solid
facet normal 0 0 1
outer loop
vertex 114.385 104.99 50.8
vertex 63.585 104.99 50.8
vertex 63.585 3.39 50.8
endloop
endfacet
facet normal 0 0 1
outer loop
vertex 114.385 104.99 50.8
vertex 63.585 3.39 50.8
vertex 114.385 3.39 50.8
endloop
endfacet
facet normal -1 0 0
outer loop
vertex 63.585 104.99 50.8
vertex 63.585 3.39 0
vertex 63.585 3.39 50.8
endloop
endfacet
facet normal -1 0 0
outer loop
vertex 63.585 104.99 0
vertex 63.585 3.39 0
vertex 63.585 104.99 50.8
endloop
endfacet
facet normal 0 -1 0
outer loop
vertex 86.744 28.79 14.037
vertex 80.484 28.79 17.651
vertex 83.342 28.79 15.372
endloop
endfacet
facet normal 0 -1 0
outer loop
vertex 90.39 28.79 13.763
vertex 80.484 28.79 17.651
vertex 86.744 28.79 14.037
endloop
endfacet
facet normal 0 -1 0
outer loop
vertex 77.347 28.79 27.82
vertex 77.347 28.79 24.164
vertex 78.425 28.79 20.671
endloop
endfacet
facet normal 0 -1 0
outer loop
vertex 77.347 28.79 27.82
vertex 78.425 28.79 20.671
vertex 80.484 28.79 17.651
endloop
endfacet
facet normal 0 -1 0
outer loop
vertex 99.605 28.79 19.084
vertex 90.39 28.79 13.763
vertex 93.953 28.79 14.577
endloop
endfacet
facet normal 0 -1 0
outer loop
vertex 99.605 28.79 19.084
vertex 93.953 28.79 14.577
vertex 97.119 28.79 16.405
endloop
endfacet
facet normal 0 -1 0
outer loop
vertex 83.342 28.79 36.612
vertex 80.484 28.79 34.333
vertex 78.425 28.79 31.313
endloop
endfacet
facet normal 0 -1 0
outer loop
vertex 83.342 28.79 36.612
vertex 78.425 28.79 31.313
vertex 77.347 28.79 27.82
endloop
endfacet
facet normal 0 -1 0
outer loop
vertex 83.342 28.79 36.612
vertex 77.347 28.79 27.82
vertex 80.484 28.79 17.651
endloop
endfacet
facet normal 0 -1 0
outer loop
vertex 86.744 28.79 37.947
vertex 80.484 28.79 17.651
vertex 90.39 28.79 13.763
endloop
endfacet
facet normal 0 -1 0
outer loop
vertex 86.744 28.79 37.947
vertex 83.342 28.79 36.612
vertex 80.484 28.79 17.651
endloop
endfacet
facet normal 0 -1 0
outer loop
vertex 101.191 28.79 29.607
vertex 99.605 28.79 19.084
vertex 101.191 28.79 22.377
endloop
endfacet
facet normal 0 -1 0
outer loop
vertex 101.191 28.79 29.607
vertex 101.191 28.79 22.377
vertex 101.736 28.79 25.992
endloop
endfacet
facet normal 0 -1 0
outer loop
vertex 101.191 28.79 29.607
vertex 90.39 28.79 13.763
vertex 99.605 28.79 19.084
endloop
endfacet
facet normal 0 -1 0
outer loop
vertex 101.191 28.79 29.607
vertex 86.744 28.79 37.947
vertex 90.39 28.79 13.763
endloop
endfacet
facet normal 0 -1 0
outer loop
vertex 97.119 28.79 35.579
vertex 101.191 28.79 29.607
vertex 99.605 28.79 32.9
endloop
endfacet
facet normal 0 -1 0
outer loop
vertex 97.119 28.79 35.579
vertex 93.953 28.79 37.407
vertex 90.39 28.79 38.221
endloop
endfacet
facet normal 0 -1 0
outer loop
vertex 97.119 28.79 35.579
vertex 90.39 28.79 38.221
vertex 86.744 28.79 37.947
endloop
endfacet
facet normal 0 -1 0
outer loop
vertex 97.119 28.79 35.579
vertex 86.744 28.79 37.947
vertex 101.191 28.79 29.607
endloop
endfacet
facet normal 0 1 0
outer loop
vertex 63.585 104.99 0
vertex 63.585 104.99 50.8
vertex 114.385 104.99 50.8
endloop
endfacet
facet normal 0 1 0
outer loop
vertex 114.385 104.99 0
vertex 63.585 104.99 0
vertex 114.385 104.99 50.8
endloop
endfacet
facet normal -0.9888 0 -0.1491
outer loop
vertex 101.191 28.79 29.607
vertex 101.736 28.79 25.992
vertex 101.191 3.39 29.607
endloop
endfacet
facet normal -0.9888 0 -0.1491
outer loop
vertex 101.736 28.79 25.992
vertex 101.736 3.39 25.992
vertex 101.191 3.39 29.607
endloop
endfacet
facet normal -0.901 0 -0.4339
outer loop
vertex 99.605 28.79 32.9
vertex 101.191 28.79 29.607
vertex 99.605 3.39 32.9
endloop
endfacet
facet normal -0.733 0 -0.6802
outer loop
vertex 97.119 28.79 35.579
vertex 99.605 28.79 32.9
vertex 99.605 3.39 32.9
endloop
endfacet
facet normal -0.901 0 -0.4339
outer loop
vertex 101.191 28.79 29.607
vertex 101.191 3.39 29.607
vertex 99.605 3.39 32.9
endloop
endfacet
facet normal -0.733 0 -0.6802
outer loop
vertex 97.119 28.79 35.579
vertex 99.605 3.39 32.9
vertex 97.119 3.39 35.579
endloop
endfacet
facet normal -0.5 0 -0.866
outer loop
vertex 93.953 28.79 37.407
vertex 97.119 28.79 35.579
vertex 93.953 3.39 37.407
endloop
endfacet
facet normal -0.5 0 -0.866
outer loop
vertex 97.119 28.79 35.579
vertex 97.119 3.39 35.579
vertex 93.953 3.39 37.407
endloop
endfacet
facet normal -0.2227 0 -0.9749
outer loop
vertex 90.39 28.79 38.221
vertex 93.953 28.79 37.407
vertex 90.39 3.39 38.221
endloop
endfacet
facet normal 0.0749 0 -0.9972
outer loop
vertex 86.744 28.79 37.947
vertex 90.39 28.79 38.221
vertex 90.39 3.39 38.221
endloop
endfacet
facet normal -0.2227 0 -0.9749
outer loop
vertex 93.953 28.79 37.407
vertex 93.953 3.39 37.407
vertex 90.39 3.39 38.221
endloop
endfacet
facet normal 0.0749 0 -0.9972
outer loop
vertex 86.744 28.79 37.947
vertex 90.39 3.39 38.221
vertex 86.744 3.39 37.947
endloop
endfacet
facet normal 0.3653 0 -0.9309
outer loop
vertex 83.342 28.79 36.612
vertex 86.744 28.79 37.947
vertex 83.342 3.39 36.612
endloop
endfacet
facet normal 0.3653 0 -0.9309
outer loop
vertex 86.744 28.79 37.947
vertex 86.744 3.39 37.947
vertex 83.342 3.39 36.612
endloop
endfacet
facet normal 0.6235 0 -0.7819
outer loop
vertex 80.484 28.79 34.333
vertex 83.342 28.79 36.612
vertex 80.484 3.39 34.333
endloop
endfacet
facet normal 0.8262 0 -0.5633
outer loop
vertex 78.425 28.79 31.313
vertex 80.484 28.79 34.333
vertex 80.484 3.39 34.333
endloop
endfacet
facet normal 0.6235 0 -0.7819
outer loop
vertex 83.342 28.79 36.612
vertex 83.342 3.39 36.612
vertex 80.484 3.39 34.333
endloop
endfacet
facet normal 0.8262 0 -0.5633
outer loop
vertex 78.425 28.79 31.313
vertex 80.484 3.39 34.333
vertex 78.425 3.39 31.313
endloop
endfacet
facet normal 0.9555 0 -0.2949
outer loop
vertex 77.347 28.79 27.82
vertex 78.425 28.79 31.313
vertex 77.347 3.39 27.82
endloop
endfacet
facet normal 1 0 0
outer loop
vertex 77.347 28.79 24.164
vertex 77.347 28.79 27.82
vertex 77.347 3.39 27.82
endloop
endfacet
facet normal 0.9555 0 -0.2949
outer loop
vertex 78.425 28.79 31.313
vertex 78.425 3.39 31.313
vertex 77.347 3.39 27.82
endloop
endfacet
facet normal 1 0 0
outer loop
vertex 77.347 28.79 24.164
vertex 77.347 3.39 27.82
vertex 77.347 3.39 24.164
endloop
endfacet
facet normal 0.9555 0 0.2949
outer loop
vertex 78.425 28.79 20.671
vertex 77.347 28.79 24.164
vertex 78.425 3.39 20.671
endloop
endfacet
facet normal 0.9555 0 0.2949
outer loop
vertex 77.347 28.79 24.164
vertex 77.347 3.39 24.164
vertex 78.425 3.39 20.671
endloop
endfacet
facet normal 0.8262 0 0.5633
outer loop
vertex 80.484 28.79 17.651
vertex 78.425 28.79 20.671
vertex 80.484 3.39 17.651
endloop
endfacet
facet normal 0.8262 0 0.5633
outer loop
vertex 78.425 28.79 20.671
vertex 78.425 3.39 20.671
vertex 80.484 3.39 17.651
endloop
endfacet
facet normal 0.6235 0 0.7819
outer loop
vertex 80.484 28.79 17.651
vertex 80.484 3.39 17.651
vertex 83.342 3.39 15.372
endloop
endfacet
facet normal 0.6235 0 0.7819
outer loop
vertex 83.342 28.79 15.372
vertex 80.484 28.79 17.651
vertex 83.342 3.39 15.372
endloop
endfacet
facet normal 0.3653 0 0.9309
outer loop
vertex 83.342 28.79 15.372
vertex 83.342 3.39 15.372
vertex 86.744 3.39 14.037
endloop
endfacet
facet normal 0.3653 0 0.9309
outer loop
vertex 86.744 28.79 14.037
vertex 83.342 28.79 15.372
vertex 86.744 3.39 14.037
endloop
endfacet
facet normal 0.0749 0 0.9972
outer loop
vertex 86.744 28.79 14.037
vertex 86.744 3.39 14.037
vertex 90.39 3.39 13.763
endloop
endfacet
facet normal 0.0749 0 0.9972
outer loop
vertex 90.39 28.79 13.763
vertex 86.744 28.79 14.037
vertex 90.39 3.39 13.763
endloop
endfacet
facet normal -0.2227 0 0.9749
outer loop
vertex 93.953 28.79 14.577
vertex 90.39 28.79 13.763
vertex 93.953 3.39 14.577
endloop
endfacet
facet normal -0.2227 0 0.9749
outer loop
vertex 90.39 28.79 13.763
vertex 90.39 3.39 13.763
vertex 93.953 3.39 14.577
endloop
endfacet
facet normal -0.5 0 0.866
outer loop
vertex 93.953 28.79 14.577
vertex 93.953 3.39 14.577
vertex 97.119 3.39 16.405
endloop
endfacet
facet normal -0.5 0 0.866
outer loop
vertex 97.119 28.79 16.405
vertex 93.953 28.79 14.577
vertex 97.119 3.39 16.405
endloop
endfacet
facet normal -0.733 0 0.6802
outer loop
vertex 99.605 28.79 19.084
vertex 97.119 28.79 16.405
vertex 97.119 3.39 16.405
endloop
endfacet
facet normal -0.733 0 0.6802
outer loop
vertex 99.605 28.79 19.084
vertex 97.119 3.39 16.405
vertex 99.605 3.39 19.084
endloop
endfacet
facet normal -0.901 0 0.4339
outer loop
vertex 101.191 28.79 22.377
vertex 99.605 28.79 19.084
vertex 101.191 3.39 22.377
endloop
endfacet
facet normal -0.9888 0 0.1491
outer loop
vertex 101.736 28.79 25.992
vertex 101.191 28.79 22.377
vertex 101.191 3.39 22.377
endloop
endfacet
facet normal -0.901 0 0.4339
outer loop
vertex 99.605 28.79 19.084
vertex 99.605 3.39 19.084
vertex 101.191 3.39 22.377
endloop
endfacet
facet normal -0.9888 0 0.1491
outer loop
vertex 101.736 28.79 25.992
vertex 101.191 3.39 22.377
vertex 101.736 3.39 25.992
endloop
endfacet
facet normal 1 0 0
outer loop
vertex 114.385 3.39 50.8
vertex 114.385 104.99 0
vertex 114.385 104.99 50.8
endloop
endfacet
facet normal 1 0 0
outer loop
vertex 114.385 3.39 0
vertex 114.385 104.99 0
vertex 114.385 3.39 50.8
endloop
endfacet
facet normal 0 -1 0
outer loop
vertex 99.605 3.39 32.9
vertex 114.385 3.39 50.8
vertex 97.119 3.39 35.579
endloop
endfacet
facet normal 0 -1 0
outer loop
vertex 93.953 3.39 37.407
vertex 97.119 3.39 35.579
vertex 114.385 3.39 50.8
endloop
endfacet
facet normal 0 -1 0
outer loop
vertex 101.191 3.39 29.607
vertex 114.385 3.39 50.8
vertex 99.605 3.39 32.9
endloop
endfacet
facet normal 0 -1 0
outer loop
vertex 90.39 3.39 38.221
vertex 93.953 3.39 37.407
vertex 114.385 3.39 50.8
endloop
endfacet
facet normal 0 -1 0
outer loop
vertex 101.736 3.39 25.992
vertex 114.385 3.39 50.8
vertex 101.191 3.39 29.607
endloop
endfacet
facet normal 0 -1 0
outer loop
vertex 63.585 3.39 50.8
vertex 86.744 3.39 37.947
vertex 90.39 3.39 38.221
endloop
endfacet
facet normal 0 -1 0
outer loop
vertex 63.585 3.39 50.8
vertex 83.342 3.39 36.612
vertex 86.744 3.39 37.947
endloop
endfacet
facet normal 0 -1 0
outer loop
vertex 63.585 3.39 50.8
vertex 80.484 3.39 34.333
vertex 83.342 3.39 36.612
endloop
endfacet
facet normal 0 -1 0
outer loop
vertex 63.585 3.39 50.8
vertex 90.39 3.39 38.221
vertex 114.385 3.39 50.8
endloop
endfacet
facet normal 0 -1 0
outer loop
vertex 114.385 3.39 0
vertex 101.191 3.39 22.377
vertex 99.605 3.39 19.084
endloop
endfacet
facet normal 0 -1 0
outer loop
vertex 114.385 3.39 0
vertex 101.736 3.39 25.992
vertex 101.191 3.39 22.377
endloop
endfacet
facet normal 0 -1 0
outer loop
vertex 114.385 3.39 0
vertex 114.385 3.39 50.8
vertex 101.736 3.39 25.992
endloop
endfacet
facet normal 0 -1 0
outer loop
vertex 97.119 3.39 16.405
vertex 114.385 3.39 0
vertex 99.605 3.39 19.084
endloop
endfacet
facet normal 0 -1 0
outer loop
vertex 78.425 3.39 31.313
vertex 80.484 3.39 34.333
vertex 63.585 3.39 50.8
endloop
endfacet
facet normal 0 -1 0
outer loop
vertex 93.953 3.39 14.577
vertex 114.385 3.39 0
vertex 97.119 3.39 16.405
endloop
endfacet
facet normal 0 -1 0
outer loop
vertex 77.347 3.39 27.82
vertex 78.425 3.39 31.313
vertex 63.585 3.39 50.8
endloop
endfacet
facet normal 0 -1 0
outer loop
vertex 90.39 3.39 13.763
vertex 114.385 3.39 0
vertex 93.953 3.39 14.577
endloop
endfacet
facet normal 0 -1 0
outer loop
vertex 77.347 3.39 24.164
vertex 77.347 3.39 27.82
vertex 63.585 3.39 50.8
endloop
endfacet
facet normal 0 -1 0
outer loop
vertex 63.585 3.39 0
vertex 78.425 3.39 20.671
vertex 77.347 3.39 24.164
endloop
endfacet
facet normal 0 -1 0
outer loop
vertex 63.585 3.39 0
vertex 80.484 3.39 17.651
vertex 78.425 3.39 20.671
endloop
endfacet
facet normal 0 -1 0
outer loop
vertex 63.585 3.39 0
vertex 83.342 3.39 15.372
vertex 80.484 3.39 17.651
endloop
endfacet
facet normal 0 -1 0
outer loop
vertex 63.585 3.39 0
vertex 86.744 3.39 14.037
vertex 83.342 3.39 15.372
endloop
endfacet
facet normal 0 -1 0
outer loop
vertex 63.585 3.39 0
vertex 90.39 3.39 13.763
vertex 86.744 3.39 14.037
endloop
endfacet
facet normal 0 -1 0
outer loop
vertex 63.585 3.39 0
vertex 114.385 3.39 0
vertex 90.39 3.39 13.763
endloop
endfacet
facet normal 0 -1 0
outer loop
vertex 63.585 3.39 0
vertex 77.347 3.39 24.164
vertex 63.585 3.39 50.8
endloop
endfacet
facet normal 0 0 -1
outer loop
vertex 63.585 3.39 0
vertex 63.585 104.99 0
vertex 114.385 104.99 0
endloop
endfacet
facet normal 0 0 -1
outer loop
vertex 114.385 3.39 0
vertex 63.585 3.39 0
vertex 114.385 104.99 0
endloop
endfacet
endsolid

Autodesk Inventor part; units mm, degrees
ref_plane "YZ Plane" through (0, 0, 0) normal (1, 0, 0) x (0, 1, 0)
ref_plane "XZ Plane" through (0, 0, 0) normal (0, 1, 0) x (-1, 0, 0)
ref_plane "XY Plane" through (0, 0, 0) normal (0, 0, 1) x (1, 0, 0)
sketch "Sketch1" plane through (0, 0, 0) normal (0, 0, 1) x (1, 0, 0)
  line L0 (63.5852, 104.9902) -> (114.3852, 104.9902)
  line L1 (114.3852, 104.9902) -> (114.3852, 3.3902)
  line L2 (114.3852, 3.3902) -> (63.5852, 3.3902)
  line L3 (63.5852, 3.3902) -> (63.5852, 104.9902)
  point P0 (0, 0)
  dimension "d0" = 50.8
  dimension "d1" = 101.6
extrude "Extrusion1" add sketch "Sketch1" along normal blind 50.8
sketch "Sketch2" plane through (63.5852, 3.3902, 0) normal (0, -1, 0) x (1, 0, 0)
  circle A0 centre (25.8879, 25.992) radius 12.2628
  point P0 (-63.5852, 0)
extrude "Extrusion2" cut sketch "Sketch2" against normal blind 25.4
properties part number "laser" material "Iron, Cast"
